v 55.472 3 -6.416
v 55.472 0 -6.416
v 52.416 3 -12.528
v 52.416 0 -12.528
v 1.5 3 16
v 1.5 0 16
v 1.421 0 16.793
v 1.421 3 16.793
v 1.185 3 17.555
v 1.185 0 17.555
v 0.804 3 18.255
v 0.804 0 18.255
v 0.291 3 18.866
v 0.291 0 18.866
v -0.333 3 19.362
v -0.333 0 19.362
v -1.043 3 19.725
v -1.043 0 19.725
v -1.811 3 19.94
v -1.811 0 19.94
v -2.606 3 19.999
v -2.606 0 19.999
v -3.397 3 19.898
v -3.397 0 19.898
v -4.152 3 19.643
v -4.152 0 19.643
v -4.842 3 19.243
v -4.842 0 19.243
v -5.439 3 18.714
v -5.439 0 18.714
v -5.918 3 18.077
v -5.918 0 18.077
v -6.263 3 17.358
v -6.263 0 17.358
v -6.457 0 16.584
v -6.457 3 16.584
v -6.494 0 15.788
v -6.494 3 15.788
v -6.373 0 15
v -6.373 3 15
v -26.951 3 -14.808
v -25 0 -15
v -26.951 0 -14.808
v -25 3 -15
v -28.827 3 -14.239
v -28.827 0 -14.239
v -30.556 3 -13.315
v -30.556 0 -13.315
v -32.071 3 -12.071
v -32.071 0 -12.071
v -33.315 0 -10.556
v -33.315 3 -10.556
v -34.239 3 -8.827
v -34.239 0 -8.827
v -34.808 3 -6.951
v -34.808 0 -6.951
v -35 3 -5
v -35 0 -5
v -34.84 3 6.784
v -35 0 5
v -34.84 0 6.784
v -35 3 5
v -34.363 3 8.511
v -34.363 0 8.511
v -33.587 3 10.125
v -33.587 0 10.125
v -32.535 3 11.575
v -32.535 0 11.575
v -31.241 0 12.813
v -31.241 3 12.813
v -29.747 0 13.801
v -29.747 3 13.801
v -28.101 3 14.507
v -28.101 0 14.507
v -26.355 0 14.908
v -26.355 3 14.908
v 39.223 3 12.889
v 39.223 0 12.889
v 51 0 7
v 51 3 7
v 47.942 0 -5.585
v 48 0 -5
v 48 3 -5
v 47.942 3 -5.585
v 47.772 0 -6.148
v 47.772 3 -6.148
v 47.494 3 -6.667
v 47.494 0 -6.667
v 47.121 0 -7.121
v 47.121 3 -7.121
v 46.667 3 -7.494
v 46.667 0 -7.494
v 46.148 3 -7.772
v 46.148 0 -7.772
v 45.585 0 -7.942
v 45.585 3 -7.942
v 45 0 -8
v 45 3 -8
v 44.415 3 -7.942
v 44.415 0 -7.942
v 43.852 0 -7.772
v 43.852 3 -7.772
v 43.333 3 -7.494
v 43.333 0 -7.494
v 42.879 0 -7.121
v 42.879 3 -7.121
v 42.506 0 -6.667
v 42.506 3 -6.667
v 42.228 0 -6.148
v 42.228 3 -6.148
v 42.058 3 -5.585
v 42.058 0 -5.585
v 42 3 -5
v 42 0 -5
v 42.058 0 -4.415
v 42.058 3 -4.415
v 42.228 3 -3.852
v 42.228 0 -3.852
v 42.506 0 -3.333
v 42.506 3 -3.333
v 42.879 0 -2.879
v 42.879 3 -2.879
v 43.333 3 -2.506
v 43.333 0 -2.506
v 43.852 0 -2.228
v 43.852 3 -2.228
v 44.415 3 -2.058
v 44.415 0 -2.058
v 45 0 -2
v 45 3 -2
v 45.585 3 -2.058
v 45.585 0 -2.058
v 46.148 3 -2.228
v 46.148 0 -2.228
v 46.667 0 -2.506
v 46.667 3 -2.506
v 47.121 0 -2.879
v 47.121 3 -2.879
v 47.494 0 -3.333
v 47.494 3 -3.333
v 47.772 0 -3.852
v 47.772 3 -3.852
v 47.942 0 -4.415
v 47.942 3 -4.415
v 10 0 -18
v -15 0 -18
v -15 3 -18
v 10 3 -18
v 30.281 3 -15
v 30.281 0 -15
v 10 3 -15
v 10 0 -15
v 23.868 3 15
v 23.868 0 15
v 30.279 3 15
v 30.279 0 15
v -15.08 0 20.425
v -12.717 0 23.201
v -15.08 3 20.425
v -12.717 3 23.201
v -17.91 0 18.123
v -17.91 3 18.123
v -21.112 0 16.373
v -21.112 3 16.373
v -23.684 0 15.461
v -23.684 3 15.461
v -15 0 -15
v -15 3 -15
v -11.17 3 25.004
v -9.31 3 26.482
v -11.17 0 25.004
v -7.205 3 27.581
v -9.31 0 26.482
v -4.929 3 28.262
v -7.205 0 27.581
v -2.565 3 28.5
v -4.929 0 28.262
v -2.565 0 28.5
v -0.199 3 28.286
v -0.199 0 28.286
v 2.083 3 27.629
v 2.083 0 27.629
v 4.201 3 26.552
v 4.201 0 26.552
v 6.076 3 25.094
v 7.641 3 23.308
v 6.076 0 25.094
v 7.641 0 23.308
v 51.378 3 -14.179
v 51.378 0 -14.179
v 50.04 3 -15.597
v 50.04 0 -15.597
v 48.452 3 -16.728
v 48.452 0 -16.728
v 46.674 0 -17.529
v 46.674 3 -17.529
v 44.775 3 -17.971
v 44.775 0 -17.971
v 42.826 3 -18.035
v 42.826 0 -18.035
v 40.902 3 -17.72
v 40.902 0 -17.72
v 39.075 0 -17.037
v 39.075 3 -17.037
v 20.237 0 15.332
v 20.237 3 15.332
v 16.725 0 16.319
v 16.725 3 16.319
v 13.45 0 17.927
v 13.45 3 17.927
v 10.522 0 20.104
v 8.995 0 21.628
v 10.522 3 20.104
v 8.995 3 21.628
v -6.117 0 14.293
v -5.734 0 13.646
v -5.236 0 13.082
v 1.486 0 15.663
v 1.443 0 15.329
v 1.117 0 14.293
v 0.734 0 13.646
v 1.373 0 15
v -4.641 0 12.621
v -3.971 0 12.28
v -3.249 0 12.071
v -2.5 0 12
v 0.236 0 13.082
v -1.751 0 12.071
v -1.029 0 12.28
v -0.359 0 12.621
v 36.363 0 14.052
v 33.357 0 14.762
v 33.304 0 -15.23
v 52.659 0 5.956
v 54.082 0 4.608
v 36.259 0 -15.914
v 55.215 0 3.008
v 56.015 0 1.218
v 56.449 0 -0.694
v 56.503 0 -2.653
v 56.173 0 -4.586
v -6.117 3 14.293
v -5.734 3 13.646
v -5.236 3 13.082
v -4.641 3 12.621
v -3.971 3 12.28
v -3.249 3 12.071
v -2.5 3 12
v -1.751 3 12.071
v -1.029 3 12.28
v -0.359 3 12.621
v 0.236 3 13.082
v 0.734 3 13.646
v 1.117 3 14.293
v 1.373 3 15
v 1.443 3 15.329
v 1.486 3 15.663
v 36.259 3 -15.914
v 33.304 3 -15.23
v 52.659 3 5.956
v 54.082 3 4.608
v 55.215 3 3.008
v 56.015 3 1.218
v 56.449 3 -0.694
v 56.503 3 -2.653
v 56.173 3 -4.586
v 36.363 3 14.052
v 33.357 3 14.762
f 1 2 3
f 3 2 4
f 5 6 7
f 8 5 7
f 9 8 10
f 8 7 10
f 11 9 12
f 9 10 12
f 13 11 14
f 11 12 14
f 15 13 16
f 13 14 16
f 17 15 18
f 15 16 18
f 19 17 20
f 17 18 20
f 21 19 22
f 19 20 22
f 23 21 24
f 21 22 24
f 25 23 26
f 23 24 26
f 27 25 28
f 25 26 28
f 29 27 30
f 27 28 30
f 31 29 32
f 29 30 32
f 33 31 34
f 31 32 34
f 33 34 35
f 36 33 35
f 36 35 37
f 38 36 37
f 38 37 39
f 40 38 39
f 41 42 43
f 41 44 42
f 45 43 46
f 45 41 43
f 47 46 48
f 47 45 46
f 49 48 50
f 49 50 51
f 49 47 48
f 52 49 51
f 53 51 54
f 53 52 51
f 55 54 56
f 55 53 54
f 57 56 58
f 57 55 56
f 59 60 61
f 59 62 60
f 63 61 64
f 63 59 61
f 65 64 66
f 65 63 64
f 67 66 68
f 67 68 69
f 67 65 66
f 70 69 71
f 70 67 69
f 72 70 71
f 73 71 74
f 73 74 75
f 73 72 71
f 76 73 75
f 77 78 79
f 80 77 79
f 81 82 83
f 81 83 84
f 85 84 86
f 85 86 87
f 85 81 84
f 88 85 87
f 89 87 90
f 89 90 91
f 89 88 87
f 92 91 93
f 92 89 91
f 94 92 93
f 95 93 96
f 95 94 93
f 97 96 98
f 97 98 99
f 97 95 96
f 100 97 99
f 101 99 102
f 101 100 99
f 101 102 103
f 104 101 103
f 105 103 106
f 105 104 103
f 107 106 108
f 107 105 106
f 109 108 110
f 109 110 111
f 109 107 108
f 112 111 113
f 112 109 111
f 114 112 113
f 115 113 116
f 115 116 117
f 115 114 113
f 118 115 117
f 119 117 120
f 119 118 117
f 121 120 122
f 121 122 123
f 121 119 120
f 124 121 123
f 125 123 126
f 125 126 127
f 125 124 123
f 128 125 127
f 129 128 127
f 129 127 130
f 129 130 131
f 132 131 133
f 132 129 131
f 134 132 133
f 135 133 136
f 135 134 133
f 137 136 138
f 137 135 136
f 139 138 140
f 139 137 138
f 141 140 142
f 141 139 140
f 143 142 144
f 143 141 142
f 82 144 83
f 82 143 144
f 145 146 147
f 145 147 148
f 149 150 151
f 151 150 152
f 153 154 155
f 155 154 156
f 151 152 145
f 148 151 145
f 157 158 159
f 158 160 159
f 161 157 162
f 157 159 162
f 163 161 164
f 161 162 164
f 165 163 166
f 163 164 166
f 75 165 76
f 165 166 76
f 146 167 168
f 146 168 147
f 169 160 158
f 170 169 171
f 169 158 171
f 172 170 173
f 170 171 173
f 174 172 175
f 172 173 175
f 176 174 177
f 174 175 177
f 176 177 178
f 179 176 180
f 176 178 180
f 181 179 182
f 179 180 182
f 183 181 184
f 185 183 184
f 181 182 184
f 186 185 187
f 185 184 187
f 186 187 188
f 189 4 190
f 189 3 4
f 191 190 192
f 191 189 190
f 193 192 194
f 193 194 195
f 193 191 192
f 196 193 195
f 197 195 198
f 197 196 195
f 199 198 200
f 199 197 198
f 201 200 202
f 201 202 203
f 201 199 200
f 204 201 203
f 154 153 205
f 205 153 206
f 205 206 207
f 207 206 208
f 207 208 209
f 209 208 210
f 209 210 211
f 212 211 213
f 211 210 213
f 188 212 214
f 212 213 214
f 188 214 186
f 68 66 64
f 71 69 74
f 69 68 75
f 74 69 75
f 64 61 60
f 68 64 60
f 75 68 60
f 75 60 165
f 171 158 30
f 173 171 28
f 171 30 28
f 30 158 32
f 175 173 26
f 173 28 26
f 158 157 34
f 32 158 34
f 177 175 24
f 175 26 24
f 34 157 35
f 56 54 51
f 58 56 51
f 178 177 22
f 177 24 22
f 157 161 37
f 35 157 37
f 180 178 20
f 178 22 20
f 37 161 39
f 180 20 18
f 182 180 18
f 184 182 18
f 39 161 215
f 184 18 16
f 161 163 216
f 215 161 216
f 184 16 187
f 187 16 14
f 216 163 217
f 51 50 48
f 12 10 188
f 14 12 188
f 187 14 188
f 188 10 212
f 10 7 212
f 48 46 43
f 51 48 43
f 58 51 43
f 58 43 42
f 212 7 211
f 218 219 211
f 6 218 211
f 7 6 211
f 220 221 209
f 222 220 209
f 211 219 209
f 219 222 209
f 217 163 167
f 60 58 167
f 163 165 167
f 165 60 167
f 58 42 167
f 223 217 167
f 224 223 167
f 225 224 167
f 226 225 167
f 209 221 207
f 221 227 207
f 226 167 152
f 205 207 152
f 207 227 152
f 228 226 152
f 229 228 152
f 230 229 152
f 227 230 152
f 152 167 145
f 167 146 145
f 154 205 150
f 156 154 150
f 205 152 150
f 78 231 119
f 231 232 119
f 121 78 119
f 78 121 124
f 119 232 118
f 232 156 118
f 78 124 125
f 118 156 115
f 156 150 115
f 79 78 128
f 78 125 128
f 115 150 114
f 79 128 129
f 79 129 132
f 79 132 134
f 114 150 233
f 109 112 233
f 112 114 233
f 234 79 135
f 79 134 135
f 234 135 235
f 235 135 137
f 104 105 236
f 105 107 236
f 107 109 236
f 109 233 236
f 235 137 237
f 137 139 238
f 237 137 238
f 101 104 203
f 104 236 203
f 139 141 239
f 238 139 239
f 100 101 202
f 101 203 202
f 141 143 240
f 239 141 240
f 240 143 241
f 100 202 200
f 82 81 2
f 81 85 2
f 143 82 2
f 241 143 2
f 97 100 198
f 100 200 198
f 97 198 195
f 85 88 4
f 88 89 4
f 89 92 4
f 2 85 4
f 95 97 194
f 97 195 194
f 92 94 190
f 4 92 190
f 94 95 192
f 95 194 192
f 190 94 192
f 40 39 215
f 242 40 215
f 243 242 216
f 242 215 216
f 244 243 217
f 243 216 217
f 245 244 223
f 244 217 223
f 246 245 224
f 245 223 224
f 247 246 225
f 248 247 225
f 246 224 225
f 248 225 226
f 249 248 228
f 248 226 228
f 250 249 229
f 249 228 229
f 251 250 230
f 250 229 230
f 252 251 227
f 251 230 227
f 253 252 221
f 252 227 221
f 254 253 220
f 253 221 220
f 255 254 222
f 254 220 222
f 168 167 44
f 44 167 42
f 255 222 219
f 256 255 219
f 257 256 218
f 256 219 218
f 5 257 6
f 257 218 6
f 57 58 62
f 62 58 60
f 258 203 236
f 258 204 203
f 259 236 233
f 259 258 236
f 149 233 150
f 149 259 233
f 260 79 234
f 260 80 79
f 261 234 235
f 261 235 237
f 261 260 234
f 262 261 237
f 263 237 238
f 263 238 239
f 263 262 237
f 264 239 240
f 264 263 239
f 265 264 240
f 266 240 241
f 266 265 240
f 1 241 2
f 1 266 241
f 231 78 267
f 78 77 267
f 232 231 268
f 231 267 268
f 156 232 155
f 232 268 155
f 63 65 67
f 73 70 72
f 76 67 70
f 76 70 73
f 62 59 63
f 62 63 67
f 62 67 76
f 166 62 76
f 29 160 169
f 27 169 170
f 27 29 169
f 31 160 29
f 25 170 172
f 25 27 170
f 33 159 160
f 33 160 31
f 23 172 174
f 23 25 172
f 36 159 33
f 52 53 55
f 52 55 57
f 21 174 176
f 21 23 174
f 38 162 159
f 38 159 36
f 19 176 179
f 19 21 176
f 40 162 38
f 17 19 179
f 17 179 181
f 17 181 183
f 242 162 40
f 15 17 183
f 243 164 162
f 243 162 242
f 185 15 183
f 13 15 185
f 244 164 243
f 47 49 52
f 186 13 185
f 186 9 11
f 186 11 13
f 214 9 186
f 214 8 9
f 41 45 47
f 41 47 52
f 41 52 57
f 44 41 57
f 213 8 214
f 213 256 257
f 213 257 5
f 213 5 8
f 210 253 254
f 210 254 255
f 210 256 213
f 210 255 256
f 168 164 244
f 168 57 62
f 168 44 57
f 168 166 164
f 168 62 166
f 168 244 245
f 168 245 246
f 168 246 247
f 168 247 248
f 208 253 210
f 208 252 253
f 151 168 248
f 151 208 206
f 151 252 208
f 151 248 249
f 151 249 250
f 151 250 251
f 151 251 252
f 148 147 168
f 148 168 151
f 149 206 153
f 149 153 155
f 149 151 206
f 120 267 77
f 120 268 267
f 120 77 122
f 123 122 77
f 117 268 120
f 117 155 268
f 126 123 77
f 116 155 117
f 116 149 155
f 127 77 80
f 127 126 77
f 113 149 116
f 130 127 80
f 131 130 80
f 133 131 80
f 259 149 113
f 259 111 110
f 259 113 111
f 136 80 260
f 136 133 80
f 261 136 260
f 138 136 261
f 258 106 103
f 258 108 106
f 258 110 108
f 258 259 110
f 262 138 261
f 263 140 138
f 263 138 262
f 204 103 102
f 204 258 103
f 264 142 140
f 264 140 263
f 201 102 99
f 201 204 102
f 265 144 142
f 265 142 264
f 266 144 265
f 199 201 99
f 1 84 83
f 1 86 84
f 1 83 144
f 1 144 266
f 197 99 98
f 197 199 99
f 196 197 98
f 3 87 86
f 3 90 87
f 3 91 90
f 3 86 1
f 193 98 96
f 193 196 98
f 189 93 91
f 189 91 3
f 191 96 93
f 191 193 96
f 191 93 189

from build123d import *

# Parameters (mm, degrees)
SKETCH1_R           = 3
SKETCH1_W           = 25
SKETCH1_H           = 3
BOSS_EXTRUDE1_DEPTH = 3
FILLET1_R           = 10
FILLET2_R           = 20


with BuildPart() as part:
    # Sketch1 → Boss-Extrude1 (new body)
    with BuildSketch(Plane(origin=(0, 0, 0), x_dir=(1, 0, 0), z_dir=(0, 1, 0))):
        with BuildLine():
            Line((10, -16), (10, -15))
            Line((10, -15), (1.372983346, -15))
            ThreePointArc((1.372983346, -15), (1.468118785, -15.49598283), (1.5, -16))
            ThreePointArc((1.5, -16), (-3.00401717, -19.968118785), (-6.372983346, -15))
            Line((-6.372983346, -15), (-15, -15))
            Line((-15, -15), (-15, -16))
            ThreePointArc((-15, -16), (-2.5, -28.5), (10, -16))
        make_face()
        with BuildLine():
            Line((47.94427191, 21.472135955), (35, 15))
            Line((35, 15), (10, 15))
            Line((10, 15), (10, 12))
            Line((10, 12), (-15, 12))
            Line((-15, 12), (-15, 15))
            Line((-15, 15), (-35, 15))
            Line((-35, 15), (-35, -15))
            Line((-35, -15), (-15, -15))
            Line((-15, -15), (-6.372983346, -15))
            ThreePointArc((-6.372983346, -15), (-2.5, -12), (1.372983346, -15))
            Line((1.372983346, -15), (10, -15))
            Line((10, -15), (35, -15))
            Line((35, -15), (59.94427191, -2.527864045))
            Line((59.94427191, -2.527864045), (47.94427191, 21.472135955))
        make_face()
        with Locations((45, 5)):
            Circle(SKETCH1_R, mode=Mode.SUBTRACT)
        with Locations((-2.5, 16.5)):
            Rectangle(SKETCH1_W, SKETCH1_H)
        with Locations((-2.5, 13.5)):
            Rectangle(SKETCH1_W, SKETCH1_H)
    extrude(amount=BOSS_EXTRUDE1_DEPTH)

    # Fillet1
    fillet1_edges = [part.edges().sort_by_distance(p)[0] for p in [
        (47.94427191, 1.5, -21.472135955),
        (59.94427191, 1.5, 2.527864045),
        (-35, 1.5, 15),
        (-35, 1.5, -15),
    ]]
    fillet(fillet1_edges, radius=FILLET1_R)

    # Fillet2
    fillet2_edges = [part.edges().sort_by_distance(p)[0] for p in [
        (35, 1.5, -15),
        (35, 1.5, 15),
        (10, 1.5, 15),
        (-15, 1.5, 15),
    ]]
    fillet(fillet2_edges, radius=FILLET2_R)


solid = part.part
